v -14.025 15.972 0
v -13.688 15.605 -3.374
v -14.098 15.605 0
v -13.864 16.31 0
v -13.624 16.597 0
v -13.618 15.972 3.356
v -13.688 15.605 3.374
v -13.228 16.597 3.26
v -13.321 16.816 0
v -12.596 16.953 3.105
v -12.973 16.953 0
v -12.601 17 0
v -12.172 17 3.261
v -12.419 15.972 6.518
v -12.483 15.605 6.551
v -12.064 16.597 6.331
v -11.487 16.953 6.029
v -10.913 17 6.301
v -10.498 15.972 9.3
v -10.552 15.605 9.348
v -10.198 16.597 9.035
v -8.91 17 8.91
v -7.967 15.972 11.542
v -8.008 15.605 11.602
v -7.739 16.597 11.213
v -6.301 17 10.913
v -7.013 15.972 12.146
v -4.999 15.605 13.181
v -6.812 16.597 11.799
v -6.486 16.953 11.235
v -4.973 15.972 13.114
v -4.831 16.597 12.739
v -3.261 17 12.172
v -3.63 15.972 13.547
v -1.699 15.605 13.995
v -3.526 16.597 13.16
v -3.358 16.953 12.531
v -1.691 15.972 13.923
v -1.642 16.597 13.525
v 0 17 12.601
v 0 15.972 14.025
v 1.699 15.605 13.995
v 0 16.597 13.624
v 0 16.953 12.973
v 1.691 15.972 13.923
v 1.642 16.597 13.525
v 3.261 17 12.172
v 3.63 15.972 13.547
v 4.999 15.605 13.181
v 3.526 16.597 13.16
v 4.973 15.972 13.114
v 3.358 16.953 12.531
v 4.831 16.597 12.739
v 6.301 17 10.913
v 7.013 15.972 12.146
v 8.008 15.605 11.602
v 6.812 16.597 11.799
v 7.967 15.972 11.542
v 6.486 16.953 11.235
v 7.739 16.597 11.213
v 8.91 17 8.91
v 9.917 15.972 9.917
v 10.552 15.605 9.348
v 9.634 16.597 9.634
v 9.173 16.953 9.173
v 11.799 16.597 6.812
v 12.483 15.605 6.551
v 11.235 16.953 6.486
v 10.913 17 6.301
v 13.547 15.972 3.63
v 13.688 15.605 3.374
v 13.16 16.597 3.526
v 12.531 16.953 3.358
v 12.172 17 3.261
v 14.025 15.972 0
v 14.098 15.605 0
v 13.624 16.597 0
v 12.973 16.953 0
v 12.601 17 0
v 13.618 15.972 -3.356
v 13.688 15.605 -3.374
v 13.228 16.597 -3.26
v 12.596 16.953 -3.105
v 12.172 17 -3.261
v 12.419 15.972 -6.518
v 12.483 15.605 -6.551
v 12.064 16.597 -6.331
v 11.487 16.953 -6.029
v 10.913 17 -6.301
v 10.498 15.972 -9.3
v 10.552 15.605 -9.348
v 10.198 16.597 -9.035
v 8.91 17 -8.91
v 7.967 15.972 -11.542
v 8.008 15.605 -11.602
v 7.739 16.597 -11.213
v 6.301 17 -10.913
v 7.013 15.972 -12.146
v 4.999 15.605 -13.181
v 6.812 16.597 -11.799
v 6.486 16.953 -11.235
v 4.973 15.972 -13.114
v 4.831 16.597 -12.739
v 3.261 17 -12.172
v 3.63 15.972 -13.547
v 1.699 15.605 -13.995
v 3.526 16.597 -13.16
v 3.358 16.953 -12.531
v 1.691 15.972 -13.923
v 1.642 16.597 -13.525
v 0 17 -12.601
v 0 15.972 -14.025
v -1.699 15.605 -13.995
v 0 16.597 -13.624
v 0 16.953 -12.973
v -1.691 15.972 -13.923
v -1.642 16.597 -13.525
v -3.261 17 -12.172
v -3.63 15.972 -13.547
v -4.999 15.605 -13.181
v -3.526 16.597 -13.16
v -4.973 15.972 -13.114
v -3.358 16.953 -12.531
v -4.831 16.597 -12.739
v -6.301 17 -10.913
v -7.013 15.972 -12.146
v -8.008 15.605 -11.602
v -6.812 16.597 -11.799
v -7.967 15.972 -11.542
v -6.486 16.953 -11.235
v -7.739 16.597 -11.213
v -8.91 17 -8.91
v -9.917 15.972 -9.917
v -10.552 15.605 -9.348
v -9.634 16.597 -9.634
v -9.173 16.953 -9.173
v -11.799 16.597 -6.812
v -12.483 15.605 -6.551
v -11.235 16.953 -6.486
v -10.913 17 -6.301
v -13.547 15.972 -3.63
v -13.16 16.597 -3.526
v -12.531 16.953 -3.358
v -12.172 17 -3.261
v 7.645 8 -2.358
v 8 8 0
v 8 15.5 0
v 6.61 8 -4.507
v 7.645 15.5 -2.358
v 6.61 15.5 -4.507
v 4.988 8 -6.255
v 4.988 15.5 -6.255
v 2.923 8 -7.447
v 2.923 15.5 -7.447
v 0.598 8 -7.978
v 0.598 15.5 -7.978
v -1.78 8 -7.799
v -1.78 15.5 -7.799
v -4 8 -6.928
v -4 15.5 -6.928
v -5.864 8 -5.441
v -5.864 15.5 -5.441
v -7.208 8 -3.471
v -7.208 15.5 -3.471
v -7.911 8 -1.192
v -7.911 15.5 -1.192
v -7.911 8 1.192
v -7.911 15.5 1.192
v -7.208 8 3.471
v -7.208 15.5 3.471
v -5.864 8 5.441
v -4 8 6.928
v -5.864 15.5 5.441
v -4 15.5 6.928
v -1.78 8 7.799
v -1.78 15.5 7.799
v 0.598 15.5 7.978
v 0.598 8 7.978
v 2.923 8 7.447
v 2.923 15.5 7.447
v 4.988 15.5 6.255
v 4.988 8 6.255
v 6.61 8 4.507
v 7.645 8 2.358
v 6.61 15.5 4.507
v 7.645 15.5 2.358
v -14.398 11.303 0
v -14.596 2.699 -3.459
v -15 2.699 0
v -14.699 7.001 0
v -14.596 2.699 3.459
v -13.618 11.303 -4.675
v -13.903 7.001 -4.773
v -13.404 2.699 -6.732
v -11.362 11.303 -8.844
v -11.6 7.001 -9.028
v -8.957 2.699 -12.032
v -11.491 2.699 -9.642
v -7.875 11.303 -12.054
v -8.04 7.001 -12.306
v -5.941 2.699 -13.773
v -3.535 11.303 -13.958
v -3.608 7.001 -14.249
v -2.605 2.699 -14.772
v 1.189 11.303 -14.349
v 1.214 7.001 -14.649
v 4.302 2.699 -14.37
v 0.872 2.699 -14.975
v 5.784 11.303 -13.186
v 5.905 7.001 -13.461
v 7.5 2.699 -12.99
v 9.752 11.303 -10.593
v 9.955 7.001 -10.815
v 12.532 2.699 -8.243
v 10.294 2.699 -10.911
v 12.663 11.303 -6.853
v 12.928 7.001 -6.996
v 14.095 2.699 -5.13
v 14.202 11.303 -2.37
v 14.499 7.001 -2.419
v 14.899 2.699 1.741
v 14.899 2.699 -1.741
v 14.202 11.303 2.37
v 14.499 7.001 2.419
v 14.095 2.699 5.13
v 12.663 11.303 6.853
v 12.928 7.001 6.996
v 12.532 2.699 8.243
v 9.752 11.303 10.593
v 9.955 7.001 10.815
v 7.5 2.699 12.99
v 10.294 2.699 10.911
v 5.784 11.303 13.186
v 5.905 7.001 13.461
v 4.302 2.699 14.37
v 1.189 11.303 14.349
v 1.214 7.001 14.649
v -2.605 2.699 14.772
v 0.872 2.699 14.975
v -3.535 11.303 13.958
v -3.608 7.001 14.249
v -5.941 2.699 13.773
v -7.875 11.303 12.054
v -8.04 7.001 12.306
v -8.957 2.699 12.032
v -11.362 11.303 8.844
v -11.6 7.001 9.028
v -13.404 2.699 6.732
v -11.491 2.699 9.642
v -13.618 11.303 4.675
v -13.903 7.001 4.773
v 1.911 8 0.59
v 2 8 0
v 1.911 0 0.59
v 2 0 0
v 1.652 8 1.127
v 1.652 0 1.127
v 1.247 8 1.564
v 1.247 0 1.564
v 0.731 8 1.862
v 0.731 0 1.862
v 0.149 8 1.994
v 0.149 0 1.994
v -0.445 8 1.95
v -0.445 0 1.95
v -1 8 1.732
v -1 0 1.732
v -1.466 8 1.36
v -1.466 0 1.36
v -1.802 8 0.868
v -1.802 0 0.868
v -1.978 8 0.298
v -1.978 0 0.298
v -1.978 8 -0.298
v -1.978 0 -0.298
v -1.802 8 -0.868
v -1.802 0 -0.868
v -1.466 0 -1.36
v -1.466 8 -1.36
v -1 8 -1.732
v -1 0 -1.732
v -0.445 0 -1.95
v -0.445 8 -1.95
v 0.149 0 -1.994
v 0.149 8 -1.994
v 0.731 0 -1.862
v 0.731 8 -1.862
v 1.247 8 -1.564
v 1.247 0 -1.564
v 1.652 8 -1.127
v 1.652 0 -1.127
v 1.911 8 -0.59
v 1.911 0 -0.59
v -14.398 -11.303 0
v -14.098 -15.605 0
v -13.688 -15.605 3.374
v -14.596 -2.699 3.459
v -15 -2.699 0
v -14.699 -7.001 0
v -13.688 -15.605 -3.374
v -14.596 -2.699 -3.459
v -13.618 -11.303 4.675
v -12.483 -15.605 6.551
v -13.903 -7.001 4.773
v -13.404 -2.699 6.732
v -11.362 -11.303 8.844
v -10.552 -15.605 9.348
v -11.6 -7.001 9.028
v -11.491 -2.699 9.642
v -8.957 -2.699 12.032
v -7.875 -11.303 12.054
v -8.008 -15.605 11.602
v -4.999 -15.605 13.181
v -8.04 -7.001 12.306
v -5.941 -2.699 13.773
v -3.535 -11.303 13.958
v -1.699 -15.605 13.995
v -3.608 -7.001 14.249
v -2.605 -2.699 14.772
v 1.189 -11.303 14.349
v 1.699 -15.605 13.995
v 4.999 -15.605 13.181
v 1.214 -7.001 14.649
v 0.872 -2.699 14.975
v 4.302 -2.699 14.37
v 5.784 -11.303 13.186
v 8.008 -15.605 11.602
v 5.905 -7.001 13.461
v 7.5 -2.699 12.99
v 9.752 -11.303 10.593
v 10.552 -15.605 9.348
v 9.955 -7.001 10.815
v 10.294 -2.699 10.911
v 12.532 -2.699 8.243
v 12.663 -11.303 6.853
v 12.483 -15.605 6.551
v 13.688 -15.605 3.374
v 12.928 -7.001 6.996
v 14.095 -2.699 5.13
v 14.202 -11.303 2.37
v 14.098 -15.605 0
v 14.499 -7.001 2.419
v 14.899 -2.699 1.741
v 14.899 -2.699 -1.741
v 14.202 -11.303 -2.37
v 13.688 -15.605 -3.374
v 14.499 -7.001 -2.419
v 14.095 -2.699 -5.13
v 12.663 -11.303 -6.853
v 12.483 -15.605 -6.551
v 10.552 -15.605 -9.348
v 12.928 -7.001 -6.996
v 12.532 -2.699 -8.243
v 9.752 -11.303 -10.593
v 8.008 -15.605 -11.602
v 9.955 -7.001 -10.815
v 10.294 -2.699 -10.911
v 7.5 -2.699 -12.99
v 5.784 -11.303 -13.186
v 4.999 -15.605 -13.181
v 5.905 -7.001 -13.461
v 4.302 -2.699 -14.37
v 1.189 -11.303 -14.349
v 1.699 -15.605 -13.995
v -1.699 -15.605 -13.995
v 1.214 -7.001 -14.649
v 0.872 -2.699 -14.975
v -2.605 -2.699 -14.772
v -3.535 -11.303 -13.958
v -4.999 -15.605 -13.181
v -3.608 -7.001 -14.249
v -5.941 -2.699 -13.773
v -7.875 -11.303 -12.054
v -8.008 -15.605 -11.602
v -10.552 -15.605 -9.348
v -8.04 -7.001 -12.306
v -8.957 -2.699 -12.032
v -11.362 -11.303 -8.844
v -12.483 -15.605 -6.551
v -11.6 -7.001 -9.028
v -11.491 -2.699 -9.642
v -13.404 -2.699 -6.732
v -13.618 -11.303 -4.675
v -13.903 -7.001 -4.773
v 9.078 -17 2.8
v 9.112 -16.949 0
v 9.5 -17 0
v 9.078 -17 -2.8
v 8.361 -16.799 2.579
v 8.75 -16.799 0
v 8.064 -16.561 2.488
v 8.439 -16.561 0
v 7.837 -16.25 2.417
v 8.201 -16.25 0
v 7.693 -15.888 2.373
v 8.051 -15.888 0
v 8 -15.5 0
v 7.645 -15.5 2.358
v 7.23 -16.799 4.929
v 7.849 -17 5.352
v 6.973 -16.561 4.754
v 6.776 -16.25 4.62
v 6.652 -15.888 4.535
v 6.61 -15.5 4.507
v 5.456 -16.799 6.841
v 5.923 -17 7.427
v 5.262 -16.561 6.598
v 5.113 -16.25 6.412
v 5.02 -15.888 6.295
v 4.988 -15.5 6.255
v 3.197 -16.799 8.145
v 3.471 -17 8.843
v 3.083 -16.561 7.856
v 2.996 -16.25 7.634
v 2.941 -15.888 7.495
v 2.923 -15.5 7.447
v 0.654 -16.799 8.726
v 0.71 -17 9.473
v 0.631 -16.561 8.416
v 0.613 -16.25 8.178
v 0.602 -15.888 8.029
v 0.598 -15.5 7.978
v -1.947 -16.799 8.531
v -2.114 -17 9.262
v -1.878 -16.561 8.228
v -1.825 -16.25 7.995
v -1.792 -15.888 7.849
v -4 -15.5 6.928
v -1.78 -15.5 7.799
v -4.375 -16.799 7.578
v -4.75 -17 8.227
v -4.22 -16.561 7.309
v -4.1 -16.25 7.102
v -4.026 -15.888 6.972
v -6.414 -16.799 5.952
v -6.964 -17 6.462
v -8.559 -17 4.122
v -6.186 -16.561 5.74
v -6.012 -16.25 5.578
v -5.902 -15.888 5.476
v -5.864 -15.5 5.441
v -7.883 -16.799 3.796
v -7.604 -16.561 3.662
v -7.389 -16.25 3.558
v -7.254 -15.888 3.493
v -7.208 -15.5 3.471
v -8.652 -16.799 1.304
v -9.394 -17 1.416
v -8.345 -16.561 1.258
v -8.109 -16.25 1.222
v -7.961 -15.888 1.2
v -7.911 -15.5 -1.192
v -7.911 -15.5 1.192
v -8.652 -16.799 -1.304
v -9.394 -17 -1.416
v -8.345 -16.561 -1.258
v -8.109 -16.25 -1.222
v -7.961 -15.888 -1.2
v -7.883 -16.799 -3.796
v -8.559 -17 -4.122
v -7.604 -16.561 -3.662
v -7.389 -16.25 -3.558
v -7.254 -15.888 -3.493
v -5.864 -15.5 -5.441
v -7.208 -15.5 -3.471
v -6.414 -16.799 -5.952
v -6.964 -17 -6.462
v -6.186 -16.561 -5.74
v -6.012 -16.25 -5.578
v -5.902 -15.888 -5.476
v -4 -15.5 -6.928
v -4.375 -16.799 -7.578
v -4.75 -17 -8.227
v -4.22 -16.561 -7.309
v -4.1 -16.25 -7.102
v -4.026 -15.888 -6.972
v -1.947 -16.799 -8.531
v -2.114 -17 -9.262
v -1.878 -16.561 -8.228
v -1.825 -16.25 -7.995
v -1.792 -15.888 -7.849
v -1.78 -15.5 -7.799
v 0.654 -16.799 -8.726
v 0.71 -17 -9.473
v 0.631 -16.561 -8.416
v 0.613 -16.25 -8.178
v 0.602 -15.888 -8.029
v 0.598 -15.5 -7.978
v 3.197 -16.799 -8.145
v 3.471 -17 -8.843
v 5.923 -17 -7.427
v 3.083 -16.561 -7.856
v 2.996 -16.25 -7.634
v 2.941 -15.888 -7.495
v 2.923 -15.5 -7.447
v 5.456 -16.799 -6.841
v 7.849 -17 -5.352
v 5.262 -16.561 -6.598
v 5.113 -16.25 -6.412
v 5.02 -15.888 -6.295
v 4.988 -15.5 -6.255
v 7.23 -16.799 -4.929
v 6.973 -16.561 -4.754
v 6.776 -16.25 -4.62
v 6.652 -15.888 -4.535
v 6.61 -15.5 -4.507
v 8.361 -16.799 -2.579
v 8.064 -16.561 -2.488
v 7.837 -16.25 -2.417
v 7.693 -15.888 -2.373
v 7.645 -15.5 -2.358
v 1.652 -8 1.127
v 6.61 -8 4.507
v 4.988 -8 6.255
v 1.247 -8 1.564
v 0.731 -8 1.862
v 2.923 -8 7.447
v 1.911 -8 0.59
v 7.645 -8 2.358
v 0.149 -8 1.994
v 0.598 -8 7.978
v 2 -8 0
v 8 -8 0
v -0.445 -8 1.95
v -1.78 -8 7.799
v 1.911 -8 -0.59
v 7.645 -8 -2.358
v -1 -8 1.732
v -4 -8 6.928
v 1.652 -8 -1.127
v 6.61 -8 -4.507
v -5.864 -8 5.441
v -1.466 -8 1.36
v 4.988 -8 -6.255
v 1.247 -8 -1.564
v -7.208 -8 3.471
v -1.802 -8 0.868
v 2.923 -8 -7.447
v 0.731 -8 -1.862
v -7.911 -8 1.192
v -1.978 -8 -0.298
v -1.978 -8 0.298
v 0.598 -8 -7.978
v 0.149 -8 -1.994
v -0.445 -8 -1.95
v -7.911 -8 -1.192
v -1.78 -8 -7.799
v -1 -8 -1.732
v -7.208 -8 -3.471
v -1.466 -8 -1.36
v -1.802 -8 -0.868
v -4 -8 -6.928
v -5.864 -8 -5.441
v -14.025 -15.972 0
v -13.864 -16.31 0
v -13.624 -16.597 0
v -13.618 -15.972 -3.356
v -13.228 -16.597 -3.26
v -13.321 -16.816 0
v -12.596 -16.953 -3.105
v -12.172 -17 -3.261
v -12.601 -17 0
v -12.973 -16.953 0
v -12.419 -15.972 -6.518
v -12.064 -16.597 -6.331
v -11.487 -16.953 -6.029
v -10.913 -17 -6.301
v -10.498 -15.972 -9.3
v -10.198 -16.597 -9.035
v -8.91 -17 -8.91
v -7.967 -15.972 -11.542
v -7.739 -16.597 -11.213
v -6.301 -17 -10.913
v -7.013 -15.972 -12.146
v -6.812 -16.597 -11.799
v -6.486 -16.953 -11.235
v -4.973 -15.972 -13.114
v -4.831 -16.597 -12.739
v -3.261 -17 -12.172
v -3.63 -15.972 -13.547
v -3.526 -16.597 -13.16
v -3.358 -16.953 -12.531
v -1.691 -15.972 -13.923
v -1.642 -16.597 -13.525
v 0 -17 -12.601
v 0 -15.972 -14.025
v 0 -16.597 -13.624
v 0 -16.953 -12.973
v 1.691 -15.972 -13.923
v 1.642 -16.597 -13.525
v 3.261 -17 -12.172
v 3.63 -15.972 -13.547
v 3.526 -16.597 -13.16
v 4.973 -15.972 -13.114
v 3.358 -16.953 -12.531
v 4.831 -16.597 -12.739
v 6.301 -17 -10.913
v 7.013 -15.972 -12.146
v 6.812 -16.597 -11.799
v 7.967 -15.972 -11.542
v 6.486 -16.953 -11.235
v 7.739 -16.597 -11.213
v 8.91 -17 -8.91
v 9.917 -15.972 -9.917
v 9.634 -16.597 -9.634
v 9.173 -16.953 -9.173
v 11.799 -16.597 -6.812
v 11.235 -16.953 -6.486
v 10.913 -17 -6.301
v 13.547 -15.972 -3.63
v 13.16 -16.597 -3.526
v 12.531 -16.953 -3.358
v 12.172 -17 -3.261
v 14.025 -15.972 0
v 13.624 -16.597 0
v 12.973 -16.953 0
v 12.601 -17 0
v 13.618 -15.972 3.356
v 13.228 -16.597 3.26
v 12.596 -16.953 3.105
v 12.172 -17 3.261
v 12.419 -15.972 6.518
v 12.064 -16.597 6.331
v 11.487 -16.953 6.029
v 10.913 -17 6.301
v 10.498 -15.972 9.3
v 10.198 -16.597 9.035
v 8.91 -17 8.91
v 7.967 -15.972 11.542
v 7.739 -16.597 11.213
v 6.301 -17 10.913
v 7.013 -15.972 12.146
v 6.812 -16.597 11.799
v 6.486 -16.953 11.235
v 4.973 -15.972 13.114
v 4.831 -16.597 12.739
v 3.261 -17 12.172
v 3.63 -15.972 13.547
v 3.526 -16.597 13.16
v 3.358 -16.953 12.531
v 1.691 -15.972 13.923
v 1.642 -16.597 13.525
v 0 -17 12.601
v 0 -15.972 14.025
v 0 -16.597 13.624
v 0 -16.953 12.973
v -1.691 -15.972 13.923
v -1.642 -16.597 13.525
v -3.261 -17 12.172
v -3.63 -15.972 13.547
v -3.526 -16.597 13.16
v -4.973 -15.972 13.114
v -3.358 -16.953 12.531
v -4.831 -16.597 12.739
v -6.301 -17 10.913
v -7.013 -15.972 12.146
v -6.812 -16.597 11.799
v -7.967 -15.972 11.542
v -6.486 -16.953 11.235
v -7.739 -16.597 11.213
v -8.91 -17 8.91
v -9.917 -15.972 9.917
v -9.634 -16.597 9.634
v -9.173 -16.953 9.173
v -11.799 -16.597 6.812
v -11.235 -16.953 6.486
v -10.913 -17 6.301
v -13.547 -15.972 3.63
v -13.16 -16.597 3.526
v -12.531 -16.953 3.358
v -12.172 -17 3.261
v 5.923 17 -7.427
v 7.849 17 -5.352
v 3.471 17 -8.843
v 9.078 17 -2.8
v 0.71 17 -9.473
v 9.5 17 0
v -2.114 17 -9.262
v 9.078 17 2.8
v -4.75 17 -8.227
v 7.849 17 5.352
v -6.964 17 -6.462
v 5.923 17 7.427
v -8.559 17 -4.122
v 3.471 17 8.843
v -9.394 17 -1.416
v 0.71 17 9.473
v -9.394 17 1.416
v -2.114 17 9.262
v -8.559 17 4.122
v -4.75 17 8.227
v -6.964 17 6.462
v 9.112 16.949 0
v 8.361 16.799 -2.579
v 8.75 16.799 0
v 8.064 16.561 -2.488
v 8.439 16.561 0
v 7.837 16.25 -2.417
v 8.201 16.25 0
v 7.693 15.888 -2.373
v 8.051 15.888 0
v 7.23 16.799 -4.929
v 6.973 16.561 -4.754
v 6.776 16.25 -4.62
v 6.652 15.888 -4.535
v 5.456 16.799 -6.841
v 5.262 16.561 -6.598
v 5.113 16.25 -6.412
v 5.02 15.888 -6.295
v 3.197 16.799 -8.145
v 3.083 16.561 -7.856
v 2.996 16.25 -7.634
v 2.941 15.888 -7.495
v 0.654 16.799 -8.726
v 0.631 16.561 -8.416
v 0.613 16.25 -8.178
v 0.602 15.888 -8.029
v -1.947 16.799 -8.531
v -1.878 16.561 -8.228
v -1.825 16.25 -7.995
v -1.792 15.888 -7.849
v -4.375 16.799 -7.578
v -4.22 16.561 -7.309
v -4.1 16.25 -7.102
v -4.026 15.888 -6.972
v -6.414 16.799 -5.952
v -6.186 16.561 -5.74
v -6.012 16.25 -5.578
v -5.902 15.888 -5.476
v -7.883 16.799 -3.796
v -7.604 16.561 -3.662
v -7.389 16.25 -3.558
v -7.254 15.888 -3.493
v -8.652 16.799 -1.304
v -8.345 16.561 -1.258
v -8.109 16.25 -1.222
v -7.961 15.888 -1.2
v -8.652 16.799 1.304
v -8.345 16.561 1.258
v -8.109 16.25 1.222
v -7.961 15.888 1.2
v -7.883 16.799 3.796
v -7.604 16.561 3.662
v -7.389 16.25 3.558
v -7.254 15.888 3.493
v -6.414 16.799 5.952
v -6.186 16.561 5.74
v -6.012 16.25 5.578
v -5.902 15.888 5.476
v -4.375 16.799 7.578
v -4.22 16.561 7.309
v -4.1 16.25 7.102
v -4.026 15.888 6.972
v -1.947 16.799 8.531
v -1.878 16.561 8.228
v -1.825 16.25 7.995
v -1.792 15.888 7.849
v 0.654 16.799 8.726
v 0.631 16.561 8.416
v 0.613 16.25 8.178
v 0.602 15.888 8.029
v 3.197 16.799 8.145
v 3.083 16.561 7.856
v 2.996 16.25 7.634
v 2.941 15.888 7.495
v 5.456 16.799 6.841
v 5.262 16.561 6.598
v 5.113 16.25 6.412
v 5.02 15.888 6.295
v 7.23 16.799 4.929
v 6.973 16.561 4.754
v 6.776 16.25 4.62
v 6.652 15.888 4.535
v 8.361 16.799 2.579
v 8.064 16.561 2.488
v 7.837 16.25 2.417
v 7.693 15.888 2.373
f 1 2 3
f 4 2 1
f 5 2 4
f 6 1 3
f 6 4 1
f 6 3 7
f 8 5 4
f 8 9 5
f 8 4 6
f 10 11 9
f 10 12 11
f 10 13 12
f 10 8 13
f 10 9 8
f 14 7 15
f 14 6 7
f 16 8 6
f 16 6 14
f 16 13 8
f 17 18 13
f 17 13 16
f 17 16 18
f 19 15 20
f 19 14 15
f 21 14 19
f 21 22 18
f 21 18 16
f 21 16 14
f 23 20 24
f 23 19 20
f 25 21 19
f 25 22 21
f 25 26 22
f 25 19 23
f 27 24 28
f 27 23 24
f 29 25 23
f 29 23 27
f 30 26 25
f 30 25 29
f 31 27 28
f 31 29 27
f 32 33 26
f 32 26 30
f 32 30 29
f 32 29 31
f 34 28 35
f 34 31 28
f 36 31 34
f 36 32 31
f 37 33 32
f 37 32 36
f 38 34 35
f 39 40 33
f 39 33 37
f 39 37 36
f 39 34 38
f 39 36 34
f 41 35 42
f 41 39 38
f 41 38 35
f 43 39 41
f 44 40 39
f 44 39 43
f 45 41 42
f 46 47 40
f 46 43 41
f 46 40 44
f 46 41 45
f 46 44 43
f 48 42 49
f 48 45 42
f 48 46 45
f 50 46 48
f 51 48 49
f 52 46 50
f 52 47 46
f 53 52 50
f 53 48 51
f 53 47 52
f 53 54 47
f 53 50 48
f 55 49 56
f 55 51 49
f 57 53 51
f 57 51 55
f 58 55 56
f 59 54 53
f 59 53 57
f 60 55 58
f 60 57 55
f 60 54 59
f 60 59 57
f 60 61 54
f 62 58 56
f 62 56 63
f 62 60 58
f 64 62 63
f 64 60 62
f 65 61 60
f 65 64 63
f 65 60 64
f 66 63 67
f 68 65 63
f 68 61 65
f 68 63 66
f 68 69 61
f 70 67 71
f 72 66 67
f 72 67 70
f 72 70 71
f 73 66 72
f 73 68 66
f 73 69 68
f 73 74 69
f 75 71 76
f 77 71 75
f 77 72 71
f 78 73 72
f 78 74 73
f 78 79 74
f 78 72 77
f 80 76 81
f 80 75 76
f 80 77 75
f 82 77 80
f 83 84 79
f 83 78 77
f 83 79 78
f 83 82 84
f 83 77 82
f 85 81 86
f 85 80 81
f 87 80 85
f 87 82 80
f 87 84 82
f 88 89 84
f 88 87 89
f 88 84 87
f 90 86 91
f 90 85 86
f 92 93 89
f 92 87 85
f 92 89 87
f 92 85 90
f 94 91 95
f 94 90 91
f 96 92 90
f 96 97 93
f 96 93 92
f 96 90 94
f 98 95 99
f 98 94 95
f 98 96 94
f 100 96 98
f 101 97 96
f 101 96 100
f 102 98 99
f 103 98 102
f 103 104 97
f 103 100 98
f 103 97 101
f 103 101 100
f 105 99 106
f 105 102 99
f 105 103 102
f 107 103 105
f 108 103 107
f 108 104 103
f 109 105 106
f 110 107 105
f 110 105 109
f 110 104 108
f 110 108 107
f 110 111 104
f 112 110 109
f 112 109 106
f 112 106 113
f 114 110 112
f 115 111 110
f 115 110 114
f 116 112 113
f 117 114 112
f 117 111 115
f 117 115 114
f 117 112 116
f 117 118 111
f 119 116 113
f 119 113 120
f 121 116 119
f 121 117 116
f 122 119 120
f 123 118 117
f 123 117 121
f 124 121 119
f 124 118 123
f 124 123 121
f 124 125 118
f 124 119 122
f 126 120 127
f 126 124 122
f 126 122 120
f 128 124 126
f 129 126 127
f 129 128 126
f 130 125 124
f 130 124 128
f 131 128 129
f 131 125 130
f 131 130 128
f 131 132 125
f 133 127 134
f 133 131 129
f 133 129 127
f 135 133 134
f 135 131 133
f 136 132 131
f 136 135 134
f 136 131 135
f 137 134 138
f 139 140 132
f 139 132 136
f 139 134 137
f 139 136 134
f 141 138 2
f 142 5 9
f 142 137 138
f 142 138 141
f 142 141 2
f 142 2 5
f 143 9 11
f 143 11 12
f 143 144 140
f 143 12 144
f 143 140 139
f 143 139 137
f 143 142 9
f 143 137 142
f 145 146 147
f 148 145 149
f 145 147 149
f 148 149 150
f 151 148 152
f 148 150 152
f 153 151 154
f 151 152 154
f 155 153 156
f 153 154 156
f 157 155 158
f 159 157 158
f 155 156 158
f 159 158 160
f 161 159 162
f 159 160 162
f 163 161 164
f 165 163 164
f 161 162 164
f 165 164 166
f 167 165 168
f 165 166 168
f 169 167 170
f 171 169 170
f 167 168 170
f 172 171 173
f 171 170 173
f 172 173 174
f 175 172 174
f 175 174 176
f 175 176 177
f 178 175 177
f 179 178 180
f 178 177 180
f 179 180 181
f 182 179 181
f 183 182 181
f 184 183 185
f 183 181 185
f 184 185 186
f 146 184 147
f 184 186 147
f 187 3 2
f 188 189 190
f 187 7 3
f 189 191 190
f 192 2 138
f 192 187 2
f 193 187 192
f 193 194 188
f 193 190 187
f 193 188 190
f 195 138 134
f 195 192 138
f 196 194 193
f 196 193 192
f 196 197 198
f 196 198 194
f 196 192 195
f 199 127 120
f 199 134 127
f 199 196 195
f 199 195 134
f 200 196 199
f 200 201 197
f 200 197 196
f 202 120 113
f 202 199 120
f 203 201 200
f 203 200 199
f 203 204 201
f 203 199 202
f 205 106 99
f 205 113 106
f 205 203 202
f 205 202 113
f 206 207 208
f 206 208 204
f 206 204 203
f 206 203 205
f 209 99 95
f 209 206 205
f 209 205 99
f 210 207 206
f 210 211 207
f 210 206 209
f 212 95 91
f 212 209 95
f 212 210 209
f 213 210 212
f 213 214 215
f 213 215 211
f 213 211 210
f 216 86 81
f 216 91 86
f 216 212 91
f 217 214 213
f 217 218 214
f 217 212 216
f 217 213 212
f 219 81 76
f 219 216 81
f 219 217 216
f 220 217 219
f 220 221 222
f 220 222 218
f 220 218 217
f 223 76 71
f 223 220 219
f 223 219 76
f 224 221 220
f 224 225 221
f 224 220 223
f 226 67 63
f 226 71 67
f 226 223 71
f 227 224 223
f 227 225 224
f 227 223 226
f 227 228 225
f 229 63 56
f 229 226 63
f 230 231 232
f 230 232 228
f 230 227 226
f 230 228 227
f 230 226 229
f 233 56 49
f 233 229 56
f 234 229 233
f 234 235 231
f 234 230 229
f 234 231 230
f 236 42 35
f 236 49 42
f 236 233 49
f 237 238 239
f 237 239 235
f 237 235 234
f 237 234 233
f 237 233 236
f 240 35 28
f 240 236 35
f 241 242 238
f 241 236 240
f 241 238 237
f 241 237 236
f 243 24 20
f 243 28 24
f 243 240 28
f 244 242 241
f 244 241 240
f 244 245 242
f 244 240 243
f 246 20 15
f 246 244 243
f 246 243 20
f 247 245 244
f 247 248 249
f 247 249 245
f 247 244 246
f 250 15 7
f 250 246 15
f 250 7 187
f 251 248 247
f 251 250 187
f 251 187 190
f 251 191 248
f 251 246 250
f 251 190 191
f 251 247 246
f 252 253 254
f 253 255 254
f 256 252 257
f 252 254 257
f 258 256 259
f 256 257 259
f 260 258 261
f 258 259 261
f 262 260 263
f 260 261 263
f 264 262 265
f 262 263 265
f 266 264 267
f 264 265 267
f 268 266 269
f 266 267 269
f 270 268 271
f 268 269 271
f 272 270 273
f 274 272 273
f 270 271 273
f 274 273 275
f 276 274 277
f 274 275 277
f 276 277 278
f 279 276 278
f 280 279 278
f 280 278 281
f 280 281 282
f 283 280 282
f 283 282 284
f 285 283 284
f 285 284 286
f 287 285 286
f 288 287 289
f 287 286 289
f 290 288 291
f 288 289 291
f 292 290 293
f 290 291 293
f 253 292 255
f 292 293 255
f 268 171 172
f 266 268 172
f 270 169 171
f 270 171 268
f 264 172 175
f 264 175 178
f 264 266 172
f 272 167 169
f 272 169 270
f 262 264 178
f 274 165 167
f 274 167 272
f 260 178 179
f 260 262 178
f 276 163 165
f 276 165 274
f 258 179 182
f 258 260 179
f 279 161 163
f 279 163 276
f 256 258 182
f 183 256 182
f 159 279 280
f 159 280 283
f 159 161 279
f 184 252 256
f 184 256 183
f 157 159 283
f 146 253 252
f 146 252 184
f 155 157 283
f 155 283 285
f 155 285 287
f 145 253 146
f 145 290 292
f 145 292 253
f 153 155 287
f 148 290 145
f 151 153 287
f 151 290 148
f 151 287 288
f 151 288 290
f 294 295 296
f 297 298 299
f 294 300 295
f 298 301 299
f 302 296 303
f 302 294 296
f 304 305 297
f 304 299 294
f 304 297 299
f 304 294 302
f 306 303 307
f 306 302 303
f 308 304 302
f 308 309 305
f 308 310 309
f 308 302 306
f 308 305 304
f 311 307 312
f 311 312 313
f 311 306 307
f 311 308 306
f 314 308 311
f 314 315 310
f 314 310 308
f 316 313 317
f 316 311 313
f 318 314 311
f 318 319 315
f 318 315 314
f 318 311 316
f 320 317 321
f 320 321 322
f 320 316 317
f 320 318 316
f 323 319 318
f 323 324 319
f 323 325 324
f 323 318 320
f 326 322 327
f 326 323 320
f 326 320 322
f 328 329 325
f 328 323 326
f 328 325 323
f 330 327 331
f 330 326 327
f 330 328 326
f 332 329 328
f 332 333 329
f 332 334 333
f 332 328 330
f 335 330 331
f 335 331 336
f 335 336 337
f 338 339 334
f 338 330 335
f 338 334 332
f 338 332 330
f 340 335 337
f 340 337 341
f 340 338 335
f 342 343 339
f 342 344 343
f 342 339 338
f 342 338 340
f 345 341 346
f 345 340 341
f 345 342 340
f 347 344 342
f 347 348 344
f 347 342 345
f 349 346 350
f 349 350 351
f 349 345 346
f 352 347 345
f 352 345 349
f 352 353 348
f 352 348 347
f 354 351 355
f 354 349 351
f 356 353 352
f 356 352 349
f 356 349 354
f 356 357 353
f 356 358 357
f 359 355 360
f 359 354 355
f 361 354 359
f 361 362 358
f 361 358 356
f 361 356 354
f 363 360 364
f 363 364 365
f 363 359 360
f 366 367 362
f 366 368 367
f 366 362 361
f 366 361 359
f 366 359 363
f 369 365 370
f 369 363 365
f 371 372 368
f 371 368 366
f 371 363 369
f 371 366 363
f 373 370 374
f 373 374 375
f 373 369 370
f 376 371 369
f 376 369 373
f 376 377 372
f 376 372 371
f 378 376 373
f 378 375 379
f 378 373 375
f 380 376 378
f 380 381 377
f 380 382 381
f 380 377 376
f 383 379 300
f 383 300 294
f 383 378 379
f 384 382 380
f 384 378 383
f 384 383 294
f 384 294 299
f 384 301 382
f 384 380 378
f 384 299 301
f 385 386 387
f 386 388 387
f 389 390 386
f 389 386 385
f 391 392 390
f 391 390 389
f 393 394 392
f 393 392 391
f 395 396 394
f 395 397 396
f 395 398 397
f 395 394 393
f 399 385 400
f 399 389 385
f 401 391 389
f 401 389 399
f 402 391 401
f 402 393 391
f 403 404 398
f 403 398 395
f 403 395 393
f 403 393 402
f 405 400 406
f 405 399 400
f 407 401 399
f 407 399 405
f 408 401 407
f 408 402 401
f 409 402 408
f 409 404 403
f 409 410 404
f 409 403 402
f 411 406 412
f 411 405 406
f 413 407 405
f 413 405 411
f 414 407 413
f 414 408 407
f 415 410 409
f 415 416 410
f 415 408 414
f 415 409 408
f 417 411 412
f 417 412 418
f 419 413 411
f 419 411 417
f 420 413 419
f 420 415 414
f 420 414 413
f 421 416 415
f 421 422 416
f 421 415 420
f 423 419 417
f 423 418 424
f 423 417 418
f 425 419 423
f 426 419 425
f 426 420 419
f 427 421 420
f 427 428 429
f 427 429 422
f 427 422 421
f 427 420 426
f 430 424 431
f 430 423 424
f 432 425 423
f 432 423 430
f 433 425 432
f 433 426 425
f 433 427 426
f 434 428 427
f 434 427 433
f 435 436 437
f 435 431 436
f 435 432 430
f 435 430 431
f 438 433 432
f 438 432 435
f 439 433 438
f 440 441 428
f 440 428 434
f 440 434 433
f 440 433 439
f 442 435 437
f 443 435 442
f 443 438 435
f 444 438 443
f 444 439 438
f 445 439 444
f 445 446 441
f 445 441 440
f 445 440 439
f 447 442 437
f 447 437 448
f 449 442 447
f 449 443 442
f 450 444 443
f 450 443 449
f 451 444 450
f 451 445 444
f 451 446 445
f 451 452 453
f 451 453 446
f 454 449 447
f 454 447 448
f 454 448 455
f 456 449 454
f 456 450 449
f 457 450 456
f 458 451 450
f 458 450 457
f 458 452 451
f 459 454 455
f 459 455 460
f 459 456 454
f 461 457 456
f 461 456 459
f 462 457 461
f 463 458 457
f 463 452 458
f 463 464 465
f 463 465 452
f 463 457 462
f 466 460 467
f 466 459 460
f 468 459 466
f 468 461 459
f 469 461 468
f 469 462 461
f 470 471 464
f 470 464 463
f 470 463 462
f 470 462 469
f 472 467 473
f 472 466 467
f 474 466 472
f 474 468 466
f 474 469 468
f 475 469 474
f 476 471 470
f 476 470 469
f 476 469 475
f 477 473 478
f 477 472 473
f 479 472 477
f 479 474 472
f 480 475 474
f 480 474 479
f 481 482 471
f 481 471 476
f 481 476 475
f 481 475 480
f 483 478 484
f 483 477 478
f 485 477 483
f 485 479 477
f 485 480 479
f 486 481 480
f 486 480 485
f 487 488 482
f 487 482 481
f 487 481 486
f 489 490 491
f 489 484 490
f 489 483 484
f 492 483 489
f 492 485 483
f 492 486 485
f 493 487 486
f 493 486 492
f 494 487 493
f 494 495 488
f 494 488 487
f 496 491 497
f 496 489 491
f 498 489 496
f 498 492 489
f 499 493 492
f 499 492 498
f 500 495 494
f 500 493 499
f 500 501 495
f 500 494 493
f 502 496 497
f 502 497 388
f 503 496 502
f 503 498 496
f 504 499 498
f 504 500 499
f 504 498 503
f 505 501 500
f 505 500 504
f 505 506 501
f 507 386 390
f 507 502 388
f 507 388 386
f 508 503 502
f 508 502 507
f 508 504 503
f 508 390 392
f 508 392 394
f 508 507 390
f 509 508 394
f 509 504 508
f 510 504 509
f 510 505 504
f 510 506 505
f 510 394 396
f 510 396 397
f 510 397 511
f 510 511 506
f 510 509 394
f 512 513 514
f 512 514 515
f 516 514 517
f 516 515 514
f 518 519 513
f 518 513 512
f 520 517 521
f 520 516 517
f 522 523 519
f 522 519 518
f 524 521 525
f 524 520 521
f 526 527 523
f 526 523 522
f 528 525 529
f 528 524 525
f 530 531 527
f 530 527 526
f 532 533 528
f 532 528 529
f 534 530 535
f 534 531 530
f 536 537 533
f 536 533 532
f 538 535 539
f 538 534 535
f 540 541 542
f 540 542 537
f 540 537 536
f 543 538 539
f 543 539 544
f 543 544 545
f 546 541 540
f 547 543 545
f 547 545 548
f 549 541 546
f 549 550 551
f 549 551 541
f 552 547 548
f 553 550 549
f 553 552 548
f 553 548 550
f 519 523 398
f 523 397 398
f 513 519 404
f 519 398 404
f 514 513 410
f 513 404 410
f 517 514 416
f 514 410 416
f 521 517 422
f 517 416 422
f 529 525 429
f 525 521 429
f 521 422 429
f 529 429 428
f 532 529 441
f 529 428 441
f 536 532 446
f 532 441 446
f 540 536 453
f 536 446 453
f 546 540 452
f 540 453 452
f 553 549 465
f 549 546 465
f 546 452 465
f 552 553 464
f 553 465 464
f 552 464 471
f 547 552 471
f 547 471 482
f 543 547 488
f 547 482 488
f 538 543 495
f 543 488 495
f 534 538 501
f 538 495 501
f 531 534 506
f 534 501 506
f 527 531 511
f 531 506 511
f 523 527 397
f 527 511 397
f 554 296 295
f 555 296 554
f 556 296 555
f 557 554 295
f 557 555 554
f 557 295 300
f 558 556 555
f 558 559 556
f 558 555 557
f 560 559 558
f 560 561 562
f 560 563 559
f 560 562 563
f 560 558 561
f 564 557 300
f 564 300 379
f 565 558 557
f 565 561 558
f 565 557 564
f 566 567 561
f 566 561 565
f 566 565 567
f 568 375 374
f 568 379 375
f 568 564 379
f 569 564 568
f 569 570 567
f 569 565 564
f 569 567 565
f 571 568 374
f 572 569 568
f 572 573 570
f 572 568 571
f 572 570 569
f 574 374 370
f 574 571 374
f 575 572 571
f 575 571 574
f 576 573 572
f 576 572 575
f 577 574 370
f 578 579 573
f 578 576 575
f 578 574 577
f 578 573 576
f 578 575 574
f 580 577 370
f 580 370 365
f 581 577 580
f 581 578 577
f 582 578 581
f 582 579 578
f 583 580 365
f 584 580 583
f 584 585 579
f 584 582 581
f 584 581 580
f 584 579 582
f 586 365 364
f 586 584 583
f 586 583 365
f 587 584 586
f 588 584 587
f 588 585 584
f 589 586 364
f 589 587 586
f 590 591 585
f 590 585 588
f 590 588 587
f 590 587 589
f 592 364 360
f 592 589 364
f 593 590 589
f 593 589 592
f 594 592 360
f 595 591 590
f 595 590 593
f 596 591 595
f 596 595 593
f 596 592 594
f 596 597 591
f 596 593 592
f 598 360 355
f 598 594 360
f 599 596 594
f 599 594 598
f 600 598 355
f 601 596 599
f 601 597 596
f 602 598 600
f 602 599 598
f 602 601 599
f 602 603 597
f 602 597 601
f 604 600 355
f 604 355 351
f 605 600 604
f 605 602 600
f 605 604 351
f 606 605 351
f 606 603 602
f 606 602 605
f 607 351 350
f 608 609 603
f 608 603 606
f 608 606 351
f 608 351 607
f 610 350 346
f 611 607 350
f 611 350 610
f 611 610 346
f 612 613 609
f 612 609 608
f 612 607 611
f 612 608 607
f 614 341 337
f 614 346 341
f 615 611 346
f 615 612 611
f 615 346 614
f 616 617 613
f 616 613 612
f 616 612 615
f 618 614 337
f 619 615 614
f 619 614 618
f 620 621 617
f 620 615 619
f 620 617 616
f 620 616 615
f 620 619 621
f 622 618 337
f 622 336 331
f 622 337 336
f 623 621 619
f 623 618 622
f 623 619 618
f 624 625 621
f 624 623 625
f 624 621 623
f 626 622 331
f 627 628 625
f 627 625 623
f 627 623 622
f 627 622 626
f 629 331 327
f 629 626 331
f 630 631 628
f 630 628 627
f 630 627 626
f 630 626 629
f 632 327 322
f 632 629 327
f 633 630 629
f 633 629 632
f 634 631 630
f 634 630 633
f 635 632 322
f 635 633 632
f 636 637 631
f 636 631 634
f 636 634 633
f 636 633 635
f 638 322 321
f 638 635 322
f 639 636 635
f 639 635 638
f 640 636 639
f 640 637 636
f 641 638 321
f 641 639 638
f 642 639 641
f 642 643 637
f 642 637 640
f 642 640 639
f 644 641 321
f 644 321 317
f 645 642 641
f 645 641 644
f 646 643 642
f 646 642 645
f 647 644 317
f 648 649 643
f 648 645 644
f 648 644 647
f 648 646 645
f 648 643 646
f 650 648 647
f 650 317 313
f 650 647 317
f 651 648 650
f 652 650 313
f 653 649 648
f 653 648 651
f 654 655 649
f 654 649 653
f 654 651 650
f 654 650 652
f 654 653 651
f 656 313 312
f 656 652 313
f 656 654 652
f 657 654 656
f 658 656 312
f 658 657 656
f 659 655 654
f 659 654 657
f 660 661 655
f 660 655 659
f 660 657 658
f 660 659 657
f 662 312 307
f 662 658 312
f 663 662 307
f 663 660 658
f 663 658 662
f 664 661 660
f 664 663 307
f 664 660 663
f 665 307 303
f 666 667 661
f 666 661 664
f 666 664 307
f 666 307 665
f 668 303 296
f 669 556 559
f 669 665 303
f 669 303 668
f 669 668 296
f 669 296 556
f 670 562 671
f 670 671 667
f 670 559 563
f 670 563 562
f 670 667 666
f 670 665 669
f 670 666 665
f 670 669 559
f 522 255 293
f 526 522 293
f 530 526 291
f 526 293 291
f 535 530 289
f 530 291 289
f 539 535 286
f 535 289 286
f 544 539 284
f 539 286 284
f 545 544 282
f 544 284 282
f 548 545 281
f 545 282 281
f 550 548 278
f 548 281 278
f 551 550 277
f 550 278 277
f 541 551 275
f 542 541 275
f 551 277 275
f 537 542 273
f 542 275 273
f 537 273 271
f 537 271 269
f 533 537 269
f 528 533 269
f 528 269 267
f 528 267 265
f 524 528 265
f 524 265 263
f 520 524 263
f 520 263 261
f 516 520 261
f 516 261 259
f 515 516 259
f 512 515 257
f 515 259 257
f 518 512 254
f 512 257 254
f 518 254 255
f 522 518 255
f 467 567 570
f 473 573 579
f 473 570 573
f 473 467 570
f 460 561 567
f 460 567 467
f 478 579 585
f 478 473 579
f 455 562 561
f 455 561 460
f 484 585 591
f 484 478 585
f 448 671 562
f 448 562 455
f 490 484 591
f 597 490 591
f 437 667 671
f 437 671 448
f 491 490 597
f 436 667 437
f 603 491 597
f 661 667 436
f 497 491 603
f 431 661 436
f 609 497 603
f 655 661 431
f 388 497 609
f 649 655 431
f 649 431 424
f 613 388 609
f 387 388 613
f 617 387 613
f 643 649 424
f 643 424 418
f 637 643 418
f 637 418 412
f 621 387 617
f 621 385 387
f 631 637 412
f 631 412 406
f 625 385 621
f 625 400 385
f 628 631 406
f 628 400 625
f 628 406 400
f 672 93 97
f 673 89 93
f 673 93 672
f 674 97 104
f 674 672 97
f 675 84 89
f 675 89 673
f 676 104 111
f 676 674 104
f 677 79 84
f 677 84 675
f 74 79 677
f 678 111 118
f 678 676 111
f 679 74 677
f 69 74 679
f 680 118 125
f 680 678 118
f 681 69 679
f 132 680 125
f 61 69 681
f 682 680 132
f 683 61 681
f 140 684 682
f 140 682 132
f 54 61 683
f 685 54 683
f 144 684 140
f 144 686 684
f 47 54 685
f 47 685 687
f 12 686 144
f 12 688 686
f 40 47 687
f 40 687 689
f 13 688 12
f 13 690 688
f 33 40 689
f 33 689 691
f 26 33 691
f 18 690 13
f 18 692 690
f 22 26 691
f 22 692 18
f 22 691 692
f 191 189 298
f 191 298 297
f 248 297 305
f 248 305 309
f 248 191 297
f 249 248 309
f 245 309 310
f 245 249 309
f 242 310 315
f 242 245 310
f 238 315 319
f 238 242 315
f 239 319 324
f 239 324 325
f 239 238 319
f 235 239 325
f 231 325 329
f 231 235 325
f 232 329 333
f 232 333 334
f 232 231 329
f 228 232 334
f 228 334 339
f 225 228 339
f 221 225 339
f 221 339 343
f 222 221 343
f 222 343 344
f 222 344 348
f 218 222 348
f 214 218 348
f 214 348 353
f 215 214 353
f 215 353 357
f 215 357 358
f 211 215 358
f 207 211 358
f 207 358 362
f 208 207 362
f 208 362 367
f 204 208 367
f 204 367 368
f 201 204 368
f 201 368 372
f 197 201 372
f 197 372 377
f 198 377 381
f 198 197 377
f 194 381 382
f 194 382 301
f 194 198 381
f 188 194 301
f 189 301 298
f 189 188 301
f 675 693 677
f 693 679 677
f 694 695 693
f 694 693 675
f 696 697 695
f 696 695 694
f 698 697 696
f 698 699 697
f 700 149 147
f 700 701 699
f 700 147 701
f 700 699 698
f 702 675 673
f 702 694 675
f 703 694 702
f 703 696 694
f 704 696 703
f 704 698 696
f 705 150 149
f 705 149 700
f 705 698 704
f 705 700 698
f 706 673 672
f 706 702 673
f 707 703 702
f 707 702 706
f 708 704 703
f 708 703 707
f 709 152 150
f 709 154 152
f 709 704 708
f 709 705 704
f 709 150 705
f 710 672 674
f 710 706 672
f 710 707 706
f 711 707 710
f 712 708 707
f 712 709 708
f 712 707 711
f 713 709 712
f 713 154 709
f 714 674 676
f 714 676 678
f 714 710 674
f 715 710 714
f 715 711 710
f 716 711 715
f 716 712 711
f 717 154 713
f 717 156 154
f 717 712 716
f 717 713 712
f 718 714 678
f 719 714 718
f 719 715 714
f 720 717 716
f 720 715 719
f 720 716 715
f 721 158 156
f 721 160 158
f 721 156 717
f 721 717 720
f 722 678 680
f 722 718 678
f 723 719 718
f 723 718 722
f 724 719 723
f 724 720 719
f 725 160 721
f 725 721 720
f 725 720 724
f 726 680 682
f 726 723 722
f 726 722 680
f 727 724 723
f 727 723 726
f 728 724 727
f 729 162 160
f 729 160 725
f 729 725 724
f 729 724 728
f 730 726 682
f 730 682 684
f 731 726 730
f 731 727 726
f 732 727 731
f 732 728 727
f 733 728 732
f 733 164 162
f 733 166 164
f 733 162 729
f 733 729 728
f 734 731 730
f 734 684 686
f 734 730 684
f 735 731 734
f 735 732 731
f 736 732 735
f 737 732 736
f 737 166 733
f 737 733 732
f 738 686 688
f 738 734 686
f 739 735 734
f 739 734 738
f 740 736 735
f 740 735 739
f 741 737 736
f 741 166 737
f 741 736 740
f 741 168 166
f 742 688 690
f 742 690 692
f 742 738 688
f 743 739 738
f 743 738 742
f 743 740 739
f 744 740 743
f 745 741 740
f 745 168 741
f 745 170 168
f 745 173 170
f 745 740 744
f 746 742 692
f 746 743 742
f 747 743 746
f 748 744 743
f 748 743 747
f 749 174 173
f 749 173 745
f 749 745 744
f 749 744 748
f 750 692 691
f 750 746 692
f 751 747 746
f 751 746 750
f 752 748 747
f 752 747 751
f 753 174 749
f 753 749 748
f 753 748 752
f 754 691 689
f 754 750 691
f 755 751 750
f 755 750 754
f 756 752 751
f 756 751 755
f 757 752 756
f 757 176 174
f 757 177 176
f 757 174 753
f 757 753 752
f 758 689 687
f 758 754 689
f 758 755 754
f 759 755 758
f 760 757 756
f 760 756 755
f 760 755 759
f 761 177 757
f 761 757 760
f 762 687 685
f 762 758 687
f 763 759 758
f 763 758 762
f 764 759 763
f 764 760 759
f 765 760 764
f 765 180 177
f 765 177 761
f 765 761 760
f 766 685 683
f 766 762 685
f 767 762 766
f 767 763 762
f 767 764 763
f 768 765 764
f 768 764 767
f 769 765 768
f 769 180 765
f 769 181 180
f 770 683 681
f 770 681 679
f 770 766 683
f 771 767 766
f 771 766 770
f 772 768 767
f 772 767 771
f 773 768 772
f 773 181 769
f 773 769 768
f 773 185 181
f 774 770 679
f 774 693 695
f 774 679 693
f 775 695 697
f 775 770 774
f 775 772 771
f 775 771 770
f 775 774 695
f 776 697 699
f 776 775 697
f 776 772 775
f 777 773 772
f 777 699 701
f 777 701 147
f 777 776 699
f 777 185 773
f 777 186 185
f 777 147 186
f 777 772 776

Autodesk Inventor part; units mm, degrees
ref_plane "YZ Plane" through (0, 0, 0) normal (1, 0, 0) x (0, 1, 0)
ref_plane "XZ Plane" through (0, 0, 0) normal (0, 1, 0) x (-1, 0, 0)
ref_plane "XY Plane" through (0, 0, 0) normal (0, 0, 1) x (1, 0, 0)
sketch "Esquisse1" plane through (0, 0, 0) normal (0, 1, 0) x (-1, 0, 0)
  circle A0 centre (0, 0) radius 15
  dimension "d0" = 30
extrude "Extrusion1" add sketch "Esquisse1" along normal blind 17
chamfer "Chanfrein1" distance 1 angle 86 1 edges at (15, 17, 0) measured on face at (-3.8878, 17, -2.119)
fillet "Congé1" radius 1.5 1 edges at (14, 17, 0)
sketch "Esquisse2" plane through (0, 17, 0) normal (0, 1, 0) x (1, 0, 0)
  circle A0 centre (0, 0) radius 8
  dimension "d7" = 16
extrude "Extrusion2" cut sketch "Esquisse2" against normal blind 9
fillet "Congé2" radius 1.5 1 edges at (-8, 17, 0)
sketch "Esquisse3" plane through (0, 0, 0) normal (0, -1, 0) x (1, 0, 0)
  circle A0 centre (0, 0) radius 2
  dimension "d11" = 4
extrude "Extrusion3" cut sketch "Esquisse3" against normal blind 9
mirror "Symétrie1" about plane through (0, 0, 0) normal (0, -1, 0) of "Extrusion1", "Chanfrein1", "Congé1", "Extrusion2", "Congé2", "Extrusion3"
properties part number "Pied" material "Caoutchouc"
